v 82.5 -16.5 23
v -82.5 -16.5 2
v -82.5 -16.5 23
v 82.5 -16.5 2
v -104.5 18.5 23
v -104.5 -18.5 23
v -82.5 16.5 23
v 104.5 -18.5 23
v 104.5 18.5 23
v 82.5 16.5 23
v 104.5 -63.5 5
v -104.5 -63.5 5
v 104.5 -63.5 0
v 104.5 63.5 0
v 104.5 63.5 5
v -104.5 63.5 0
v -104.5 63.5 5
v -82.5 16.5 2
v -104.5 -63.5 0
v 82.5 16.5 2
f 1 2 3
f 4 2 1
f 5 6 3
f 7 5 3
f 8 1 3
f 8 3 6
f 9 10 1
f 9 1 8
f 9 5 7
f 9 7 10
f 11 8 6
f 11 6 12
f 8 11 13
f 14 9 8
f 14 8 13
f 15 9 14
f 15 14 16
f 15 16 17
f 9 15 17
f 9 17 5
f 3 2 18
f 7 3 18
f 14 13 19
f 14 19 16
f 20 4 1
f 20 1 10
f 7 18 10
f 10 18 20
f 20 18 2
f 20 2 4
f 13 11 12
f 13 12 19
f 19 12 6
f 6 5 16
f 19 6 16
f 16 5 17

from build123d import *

# Parameters (mm, degrees)
F0_W     = 165
F0_H     = 33
F1_DEPTH = 2
F0_W_2   = 169
F0_H_2   = 37
F2_DEPTH = 23
F0_W_3   = 20
F3_DEPTH = 23
F5_DEPTH = 209


with BuildPart() as f1:
    # F0 (on Top) → F1 (new body)
    with BuildSketch(Plane.XY):
        Rectangle(F0_W, F0_H)
    extrude(amount=F1_DEPTH)

    # F0 (on Top) → F2 (join)
    with BuildSketch(Plane.XY):
        Rectangle(F0_W_2, F0_H_2)
        Rectangle(F0_W, F0_H, mode=Mode.SUBTRACT)
    extrude(amount=F2_DEPTH)

    # F0 (on Top) → F3 (join)
    with BuildSketch(Plane.XY):
        with Locations((-94.5, 0)):
            Rectangle(F0_W_3, F0_H_2)
        with Locations((94.5, 0)):
            Rectangle(F0_W_3, F0_H_2)
    extrude(amount=F3_DEPTH)

    # F4 (on face) → F5 (join)
    with BuildSketch(Plane.YZ.offset(104.5)):
        Polygon((-63.5, 0), (-18.5, 0), (-18.5, 23), (-63.5, 5), align=None)
        Polygon((18.5, 23), (18.5, 0), (63.5, 0), (63.5, 5), align=None)
    extrude(amount=-F5_DEPTH)


solid = f1.part
